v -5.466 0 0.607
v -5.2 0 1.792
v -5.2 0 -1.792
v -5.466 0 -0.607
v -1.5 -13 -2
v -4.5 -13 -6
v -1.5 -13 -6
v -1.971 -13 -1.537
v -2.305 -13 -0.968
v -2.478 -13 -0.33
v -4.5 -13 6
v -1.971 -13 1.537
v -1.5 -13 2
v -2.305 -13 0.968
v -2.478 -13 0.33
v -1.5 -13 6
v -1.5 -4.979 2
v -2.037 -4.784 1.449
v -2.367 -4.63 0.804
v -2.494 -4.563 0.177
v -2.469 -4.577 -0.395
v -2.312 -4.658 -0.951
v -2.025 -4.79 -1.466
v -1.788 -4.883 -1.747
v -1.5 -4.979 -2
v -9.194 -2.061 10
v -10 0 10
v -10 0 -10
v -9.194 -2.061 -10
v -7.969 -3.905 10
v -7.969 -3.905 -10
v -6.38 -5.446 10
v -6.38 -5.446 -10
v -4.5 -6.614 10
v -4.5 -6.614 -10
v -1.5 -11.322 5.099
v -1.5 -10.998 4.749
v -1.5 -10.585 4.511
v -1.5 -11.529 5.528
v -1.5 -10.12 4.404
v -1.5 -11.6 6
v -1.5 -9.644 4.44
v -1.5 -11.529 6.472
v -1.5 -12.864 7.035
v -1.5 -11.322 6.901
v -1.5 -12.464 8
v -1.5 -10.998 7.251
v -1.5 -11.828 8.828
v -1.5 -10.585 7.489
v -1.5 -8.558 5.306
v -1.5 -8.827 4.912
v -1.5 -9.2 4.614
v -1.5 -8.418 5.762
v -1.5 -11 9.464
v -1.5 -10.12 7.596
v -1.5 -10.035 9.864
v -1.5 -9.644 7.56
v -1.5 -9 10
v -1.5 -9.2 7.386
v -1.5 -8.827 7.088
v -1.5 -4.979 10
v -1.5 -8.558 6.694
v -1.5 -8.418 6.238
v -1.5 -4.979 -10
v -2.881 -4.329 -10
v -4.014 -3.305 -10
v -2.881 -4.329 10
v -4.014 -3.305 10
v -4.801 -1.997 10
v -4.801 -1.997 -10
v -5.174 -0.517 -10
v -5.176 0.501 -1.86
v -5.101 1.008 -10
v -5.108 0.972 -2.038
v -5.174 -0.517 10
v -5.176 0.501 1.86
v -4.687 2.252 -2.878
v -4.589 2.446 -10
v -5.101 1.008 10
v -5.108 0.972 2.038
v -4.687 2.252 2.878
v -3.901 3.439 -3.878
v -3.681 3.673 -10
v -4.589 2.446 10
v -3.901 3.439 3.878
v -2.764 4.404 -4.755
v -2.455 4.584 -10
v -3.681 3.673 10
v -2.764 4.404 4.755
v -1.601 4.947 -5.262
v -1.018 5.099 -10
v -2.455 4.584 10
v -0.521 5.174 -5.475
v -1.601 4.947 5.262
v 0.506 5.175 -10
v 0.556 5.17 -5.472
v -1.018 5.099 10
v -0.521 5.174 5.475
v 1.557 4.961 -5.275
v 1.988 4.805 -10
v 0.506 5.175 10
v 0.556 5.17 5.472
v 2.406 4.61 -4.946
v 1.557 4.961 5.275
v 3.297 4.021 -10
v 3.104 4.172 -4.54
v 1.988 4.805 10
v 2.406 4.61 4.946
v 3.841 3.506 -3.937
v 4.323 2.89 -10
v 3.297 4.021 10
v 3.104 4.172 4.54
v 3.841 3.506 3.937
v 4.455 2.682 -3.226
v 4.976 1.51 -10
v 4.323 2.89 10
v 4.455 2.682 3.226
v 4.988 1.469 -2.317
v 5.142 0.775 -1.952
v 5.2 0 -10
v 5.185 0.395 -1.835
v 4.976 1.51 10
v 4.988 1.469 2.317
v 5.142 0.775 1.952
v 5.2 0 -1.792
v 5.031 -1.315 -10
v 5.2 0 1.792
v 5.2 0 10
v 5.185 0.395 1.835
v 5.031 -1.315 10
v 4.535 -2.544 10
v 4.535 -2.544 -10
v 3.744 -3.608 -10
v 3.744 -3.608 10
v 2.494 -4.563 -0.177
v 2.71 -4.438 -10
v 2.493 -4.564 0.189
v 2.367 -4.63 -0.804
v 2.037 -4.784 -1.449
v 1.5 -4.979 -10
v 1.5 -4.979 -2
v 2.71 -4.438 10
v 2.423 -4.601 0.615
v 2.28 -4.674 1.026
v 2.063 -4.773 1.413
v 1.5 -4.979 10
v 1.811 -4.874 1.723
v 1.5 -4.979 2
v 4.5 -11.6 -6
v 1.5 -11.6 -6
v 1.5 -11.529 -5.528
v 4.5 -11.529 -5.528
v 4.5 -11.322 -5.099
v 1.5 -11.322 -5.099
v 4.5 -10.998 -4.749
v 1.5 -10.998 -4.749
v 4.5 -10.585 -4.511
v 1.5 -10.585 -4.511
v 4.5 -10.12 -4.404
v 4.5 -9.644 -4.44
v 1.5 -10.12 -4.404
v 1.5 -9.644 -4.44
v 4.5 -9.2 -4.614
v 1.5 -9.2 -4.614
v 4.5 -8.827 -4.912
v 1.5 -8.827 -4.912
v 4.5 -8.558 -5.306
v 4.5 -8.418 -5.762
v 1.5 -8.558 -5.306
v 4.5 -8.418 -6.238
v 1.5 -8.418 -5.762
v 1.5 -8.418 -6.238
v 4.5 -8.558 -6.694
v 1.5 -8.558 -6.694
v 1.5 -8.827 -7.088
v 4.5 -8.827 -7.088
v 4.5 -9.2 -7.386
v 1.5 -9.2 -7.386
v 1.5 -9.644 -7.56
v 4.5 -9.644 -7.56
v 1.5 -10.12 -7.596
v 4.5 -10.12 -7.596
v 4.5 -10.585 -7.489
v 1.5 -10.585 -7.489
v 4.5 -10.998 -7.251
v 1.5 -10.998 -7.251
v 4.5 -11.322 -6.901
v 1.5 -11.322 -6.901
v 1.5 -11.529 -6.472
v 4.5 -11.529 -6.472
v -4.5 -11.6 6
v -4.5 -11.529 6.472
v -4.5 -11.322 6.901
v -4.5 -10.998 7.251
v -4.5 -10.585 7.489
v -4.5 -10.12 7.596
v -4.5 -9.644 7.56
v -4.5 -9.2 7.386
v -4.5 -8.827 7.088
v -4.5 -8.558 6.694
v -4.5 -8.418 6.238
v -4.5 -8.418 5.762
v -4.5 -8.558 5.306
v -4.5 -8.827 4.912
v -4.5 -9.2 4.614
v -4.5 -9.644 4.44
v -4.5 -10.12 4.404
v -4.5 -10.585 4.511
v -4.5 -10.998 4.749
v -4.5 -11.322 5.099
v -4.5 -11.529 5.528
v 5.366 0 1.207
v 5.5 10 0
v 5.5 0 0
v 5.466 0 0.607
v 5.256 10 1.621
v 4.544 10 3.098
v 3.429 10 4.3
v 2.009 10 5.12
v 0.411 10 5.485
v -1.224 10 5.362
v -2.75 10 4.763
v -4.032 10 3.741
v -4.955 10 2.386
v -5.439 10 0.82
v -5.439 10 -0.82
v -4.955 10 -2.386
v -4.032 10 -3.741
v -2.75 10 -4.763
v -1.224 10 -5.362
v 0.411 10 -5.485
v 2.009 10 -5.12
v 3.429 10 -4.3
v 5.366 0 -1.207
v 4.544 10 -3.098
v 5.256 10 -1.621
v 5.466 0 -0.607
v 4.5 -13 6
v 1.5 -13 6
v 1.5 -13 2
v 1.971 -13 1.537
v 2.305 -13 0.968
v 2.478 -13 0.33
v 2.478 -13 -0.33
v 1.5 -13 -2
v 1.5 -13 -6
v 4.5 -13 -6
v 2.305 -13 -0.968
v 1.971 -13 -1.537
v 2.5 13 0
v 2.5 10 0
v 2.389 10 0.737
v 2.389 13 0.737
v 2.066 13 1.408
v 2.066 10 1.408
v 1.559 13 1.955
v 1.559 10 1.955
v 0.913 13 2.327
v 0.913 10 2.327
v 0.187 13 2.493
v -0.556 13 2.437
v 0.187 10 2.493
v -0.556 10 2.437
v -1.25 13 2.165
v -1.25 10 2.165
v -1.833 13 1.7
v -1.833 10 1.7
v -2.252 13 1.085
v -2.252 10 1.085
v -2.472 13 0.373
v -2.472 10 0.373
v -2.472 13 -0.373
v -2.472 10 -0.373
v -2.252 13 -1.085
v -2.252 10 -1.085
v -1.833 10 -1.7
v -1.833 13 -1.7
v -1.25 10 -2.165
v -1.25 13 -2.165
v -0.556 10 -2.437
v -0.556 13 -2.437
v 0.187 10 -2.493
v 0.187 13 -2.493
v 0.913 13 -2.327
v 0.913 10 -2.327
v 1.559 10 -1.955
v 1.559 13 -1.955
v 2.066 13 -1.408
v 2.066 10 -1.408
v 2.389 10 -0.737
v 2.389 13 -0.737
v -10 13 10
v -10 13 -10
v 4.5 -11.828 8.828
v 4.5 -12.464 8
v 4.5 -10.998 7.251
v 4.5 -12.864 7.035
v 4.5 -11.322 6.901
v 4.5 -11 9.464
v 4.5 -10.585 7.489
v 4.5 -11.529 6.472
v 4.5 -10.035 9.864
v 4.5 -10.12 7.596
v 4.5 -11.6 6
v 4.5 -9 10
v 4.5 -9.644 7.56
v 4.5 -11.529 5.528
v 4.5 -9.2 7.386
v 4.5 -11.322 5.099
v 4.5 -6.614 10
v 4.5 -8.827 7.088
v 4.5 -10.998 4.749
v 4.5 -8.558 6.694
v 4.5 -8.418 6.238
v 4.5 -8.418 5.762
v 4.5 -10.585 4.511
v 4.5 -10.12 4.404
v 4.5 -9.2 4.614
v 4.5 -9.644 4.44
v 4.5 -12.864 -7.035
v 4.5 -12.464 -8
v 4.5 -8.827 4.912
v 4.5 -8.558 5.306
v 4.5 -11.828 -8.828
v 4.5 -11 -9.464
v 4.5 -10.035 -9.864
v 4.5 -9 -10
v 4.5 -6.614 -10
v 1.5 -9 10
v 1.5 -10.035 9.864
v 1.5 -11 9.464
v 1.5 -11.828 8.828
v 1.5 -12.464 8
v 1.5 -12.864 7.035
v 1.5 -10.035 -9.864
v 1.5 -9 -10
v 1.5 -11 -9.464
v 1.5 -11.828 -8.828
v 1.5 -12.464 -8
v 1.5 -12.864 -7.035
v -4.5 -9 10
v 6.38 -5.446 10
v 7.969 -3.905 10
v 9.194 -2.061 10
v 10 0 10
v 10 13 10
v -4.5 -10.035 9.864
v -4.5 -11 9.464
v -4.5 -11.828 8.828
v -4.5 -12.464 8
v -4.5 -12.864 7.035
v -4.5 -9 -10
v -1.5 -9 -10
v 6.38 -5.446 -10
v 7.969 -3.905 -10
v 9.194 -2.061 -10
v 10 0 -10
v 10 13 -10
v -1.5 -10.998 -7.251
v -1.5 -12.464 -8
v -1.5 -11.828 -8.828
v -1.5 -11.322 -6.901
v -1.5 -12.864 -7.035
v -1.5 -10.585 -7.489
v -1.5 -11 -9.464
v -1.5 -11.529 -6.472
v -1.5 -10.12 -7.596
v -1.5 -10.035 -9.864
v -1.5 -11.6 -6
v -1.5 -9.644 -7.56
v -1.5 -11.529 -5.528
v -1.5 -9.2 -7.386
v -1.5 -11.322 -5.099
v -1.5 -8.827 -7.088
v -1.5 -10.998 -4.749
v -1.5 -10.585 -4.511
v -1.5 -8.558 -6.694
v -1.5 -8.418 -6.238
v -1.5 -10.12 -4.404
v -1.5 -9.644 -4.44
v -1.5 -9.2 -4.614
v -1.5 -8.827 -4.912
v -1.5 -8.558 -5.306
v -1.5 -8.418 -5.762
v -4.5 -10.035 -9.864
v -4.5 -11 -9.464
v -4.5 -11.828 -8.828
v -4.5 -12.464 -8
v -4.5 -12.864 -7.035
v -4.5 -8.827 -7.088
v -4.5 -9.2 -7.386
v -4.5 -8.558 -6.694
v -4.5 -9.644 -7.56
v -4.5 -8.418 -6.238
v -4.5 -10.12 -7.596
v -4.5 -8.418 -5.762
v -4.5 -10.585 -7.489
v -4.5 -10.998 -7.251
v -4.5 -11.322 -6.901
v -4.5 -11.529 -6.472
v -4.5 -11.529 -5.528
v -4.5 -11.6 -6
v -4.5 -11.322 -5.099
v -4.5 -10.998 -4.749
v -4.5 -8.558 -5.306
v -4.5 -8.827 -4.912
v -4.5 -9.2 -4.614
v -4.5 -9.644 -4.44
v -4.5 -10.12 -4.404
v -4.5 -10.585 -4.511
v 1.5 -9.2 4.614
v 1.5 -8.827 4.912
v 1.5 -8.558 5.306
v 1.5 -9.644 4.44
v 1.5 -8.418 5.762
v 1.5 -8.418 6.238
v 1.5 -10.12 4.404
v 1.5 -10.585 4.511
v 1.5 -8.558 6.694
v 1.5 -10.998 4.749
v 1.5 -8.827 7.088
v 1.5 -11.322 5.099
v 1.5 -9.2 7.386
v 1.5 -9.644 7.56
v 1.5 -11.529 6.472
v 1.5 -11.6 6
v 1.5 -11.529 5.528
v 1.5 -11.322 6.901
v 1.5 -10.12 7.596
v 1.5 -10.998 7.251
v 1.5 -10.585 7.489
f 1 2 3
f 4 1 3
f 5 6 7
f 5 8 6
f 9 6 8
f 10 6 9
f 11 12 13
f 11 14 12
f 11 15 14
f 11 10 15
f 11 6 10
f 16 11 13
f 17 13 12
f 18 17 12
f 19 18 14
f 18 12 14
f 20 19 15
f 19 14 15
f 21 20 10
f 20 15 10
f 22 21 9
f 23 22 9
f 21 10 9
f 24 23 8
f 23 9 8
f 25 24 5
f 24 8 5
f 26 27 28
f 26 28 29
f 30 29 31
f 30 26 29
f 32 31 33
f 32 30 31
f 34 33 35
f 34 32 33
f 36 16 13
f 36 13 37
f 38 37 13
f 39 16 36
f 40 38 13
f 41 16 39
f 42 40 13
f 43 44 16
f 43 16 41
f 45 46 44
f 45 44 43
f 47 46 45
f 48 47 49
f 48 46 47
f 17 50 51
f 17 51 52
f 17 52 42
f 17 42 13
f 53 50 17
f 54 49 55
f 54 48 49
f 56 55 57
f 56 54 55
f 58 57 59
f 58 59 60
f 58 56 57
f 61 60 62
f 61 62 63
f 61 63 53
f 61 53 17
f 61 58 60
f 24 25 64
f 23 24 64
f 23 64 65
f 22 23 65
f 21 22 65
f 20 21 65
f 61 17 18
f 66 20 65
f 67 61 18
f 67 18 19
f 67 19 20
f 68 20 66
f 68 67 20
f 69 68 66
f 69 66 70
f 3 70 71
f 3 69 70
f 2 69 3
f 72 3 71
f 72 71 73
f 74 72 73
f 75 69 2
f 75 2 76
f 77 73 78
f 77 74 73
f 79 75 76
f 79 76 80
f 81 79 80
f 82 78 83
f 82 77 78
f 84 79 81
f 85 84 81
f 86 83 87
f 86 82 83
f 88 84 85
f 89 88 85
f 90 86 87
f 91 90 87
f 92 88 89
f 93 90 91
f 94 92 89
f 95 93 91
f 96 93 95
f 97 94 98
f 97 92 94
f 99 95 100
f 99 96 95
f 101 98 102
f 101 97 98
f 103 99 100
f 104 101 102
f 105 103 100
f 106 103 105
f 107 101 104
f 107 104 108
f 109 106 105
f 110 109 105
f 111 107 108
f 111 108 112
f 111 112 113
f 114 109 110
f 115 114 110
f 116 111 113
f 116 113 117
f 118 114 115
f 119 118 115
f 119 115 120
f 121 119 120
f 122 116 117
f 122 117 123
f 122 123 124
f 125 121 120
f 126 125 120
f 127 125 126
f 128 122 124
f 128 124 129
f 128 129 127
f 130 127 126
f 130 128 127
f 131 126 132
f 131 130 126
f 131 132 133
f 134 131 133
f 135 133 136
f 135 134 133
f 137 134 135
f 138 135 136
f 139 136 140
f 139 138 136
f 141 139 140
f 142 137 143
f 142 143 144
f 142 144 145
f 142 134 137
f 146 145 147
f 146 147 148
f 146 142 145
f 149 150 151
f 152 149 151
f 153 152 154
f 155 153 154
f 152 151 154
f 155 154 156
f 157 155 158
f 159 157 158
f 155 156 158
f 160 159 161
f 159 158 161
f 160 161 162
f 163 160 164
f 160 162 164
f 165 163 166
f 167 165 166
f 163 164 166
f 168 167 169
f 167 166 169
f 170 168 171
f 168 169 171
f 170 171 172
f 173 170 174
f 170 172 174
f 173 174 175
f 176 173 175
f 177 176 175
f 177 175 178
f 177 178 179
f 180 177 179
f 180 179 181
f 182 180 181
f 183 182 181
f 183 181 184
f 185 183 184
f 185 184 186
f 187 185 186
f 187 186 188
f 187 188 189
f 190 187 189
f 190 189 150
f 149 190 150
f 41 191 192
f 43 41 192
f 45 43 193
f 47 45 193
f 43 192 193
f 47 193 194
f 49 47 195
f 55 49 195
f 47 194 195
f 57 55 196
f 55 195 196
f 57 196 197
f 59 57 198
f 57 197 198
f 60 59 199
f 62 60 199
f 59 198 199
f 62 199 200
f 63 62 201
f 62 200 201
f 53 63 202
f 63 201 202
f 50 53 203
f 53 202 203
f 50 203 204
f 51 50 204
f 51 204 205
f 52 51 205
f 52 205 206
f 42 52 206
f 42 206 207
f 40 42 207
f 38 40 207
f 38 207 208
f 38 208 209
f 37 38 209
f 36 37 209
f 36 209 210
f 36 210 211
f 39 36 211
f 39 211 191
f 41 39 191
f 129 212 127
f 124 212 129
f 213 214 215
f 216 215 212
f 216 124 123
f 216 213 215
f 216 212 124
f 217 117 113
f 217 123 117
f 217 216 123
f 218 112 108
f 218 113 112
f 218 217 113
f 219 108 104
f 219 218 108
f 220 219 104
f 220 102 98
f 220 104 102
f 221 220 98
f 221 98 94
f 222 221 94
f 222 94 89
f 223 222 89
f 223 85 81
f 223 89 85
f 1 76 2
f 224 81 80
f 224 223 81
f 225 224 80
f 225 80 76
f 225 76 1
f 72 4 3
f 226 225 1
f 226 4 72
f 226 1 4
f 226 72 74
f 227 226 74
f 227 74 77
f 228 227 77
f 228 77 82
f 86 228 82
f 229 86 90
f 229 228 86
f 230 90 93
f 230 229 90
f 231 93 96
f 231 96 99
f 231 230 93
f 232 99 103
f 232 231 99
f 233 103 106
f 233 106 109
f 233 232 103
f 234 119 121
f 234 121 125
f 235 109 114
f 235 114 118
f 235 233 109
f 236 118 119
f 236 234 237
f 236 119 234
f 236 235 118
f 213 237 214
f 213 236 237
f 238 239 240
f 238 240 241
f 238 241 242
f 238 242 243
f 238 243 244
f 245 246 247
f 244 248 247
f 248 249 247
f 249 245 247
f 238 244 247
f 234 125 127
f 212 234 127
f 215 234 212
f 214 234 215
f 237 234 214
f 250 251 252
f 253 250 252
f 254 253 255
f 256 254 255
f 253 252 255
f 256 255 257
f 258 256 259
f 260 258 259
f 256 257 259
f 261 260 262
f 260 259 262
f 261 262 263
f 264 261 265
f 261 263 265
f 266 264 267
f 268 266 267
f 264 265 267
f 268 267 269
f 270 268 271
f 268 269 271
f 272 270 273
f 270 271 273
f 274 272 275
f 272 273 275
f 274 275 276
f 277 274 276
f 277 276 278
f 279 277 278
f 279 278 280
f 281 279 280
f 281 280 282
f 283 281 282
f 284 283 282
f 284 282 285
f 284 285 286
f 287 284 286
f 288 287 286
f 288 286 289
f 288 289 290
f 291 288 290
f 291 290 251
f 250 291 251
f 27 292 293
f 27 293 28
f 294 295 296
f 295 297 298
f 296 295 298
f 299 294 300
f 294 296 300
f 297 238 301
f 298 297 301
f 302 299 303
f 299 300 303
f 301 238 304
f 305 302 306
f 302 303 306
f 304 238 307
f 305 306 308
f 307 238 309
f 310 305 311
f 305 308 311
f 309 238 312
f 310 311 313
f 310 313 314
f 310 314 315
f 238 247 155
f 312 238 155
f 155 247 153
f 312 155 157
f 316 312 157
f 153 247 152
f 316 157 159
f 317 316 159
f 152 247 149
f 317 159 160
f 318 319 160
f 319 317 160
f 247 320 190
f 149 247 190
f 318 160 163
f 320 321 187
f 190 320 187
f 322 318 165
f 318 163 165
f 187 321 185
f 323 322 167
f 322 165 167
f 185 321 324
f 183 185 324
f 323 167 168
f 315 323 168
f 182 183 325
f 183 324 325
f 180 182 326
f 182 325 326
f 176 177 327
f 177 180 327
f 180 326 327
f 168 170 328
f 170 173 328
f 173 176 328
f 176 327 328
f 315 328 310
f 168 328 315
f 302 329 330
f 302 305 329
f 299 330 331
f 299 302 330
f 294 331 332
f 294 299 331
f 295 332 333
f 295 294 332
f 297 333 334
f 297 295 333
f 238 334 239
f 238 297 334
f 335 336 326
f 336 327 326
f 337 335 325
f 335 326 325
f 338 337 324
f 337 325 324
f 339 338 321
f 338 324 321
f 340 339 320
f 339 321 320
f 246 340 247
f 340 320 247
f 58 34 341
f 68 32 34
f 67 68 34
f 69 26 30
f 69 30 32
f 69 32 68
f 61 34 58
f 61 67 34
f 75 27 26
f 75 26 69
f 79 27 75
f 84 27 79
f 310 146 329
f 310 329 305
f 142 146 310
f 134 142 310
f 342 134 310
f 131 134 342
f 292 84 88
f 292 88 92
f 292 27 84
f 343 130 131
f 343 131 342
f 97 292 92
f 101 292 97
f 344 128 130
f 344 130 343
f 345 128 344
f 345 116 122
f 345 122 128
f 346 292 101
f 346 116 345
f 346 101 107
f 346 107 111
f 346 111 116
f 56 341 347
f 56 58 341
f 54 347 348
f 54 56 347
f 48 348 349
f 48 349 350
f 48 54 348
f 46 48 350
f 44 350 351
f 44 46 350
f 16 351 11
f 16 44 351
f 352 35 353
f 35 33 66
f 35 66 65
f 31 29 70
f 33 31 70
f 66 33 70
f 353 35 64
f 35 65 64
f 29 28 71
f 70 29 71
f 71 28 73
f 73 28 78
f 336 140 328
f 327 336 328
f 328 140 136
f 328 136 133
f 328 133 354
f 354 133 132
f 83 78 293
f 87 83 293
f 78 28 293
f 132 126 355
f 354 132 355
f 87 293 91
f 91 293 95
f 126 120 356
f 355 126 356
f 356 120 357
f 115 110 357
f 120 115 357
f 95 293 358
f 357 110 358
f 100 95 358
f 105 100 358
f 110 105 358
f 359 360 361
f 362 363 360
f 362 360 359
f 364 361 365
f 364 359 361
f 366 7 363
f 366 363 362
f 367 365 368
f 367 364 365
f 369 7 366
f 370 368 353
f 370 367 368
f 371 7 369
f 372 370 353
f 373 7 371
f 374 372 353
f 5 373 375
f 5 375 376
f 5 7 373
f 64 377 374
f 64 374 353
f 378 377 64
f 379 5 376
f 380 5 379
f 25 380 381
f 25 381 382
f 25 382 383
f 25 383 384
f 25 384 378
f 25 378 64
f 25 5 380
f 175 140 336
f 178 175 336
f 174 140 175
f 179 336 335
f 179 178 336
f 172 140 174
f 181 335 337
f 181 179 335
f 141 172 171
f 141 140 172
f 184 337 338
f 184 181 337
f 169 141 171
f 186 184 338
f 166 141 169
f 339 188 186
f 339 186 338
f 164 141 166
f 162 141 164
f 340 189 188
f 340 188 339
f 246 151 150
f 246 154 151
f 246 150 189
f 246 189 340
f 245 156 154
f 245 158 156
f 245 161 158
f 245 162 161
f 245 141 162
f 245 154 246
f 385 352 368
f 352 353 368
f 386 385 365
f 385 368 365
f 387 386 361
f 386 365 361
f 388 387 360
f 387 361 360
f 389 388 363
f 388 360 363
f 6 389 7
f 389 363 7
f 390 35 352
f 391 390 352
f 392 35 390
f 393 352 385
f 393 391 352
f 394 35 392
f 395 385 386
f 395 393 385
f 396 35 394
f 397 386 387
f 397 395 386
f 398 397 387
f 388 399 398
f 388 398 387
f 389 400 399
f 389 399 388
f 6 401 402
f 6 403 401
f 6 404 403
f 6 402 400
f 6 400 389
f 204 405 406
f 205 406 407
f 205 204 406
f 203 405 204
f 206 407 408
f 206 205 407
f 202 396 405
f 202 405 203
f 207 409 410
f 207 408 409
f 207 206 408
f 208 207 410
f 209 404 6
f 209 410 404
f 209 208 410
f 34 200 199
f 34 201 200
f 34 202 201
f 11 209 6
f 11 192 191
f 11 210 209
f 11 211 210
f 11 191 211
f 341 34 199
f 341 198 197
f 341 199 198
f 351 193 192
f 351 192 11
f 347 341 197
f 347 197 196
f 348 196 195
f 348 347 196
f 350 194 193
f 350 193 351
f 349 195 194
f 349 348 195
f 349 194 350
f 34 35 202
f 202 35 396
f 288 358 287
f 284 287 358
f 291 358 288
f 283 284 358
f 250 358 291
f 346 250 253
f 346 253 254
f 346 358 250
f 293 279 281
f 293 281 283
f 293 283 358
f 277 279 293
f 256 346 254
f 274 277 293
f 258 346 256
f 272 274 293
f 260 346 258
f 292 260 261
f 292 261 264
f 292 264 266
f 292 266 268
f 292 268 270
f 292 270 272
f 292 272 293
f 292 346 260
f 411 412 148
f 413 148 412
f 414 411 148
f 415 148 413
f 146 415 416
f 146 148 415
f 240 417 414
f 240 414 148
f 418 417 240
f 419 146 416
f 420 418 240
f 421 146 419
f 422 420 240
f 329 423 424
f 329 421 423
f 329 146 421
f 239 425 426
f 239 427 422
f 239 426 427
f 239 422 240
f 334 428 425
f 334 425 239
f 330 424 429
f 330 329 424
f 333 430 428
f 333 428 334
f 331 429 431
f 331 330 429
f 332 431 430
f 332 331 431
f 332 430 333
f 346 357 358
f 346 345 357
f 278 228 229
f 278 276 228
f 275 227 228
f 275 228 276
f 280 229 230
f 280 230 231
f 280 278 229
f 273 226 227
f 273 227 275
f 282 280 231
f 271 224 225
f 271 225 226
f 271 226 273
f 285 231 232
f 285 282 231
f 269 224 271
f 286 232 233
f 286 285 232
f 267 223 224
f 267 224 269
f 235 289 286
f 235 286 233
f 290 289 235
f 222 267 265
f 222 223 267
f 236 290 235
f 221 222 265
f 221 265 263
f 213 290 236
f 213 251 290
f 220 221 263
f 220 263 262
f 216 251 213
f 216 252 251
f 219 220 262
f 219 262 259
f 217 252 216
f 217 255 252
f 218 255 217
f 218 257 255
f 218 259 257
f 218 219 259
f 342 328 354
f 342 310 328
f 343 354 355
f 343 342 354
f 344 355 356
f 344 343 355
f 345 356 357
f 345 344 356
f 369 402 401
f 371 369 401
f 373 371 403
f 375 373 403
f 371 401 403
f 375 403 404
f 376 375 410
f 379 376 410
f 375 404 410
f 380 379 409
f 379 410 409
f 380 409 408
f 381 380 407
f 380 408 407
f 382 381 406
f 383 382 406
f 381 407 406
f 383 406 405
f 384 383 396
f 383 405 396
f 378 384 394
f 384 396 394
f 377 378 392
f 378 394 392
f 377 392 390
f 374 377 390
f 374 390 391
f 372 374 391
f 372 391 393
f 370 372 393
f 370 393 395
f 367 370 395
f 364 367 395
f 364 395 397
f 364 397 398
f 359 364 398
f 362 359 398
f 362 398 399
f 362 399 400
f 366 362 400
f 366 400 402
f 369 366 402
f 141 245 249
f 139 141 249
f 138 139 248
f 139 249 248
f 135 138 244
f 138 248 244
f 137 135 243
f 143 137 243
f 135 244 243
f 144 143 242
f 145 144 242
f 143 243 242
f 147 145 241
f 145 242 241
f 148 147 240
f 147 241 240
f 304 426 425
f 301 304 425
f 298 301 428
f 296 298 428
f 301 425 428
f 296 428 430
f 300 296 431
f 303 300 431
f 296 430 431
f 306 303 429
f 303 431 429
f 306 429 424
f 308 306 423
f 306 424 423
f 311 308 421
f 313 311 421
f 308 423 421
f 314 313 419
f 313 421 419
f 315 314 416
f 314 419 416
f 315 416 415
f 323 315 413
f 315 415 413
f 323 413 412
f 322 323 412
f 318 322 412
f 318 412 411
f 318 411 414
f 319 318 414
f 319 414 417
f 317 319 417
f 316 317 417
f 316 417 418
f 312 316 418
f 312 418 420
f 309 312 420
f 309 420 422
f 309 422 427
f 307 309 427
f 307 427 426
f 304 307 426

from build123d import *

# Parameters (mm, degrees)
F1_DEPTH = 10
F3_D     = 5
F4_R     = 1.6
F5_DEPTH = 14.501
F7_R     = 5.5
F8_DEPTH = 10
F9_R     = 4


# Not quite as in the source:
# - an extrude ends at something that could not be found from the text; its depth is read off the source's solid


with BuildPart() as f1:
    # F0 (on Top) → F1 (new body, symmetric)
    with BuildSketch(Plane.XY):
        with BuildLine():
            Line((10, 13), (-10, 13))
            Line((-10, 13), (-10, 0))
            ThreePointArc((-10, 0), (-7.9686887253, -3.9047945105), (-4.5, -6.6143782777))
            Line((-4.5, -6.6143782777), (-4.5, -13))
            Line((-4.5, -13), (-1.5, -13))
            Line((-1.5, -13), (-1.5, -4.9789557138))
            ThreePointArc((-1.5, -4.9789557138), (-3.1016124839, 4.1737273509), (5.2, 0))
            ThreePointArc((5.2, 0), (4.1737273509, -3.1016124839), (1.5, -4.9789557138))
            Line((1.5, -4.9789557138), (1.5, -13))
            Line((1.5, -13), (4.5, -13))
            Line((4.5, -13), (4.5, -6.6143782777))
            ThreePointArc((4.5, -6.6143782777), (7.9686887253, -3.9047945105), (10, 0))
            Line((10, 0), (10, 13))
        make_face()
    extrude(amount=F1_DEPTH, both=True)

    # F3 (through all)
    with Locations(Plane(origin=(0, 13, 0), x_dir=(-1, 0, 0), z_dir=(0, 1, 0))):
        with Locations((0, 0)):
            Hole(F3_D / 2)

    # F4 (on face) → F5 (cut, through all)
    with BuildSketch(Plane(origin=(-4.5, 0, 0), x_dir=(0, -1, 0), z_dir=(-1, 0, 0))):
        with Locations((10, 6)):
            Circle(F4_R)
        with Locations((10, -6)):
            Circle(F4_R)
    extrude(amount=-F5_DEPTH, mode=Mode.SUBTRACT)

    # F7 (on offset) → F8 (cut, through all)
    with BuildSketch(Plane.XZ.offset(-10)):
        Circle(F7_R)
    extrude(amount=F8_DEPTH, mode=Mode.SUBTRACT)

    # F9
    f9_edges = [f1.edges().sort_by_distance(p)[0] for p in [
        (3, -13, 10),
        (-3, -13, 10),
        (-3, -13, -10),
        (3, -13, -10),
    ]]
    fillet(f9_edges, radius=F9_R)


solid = f1.part
